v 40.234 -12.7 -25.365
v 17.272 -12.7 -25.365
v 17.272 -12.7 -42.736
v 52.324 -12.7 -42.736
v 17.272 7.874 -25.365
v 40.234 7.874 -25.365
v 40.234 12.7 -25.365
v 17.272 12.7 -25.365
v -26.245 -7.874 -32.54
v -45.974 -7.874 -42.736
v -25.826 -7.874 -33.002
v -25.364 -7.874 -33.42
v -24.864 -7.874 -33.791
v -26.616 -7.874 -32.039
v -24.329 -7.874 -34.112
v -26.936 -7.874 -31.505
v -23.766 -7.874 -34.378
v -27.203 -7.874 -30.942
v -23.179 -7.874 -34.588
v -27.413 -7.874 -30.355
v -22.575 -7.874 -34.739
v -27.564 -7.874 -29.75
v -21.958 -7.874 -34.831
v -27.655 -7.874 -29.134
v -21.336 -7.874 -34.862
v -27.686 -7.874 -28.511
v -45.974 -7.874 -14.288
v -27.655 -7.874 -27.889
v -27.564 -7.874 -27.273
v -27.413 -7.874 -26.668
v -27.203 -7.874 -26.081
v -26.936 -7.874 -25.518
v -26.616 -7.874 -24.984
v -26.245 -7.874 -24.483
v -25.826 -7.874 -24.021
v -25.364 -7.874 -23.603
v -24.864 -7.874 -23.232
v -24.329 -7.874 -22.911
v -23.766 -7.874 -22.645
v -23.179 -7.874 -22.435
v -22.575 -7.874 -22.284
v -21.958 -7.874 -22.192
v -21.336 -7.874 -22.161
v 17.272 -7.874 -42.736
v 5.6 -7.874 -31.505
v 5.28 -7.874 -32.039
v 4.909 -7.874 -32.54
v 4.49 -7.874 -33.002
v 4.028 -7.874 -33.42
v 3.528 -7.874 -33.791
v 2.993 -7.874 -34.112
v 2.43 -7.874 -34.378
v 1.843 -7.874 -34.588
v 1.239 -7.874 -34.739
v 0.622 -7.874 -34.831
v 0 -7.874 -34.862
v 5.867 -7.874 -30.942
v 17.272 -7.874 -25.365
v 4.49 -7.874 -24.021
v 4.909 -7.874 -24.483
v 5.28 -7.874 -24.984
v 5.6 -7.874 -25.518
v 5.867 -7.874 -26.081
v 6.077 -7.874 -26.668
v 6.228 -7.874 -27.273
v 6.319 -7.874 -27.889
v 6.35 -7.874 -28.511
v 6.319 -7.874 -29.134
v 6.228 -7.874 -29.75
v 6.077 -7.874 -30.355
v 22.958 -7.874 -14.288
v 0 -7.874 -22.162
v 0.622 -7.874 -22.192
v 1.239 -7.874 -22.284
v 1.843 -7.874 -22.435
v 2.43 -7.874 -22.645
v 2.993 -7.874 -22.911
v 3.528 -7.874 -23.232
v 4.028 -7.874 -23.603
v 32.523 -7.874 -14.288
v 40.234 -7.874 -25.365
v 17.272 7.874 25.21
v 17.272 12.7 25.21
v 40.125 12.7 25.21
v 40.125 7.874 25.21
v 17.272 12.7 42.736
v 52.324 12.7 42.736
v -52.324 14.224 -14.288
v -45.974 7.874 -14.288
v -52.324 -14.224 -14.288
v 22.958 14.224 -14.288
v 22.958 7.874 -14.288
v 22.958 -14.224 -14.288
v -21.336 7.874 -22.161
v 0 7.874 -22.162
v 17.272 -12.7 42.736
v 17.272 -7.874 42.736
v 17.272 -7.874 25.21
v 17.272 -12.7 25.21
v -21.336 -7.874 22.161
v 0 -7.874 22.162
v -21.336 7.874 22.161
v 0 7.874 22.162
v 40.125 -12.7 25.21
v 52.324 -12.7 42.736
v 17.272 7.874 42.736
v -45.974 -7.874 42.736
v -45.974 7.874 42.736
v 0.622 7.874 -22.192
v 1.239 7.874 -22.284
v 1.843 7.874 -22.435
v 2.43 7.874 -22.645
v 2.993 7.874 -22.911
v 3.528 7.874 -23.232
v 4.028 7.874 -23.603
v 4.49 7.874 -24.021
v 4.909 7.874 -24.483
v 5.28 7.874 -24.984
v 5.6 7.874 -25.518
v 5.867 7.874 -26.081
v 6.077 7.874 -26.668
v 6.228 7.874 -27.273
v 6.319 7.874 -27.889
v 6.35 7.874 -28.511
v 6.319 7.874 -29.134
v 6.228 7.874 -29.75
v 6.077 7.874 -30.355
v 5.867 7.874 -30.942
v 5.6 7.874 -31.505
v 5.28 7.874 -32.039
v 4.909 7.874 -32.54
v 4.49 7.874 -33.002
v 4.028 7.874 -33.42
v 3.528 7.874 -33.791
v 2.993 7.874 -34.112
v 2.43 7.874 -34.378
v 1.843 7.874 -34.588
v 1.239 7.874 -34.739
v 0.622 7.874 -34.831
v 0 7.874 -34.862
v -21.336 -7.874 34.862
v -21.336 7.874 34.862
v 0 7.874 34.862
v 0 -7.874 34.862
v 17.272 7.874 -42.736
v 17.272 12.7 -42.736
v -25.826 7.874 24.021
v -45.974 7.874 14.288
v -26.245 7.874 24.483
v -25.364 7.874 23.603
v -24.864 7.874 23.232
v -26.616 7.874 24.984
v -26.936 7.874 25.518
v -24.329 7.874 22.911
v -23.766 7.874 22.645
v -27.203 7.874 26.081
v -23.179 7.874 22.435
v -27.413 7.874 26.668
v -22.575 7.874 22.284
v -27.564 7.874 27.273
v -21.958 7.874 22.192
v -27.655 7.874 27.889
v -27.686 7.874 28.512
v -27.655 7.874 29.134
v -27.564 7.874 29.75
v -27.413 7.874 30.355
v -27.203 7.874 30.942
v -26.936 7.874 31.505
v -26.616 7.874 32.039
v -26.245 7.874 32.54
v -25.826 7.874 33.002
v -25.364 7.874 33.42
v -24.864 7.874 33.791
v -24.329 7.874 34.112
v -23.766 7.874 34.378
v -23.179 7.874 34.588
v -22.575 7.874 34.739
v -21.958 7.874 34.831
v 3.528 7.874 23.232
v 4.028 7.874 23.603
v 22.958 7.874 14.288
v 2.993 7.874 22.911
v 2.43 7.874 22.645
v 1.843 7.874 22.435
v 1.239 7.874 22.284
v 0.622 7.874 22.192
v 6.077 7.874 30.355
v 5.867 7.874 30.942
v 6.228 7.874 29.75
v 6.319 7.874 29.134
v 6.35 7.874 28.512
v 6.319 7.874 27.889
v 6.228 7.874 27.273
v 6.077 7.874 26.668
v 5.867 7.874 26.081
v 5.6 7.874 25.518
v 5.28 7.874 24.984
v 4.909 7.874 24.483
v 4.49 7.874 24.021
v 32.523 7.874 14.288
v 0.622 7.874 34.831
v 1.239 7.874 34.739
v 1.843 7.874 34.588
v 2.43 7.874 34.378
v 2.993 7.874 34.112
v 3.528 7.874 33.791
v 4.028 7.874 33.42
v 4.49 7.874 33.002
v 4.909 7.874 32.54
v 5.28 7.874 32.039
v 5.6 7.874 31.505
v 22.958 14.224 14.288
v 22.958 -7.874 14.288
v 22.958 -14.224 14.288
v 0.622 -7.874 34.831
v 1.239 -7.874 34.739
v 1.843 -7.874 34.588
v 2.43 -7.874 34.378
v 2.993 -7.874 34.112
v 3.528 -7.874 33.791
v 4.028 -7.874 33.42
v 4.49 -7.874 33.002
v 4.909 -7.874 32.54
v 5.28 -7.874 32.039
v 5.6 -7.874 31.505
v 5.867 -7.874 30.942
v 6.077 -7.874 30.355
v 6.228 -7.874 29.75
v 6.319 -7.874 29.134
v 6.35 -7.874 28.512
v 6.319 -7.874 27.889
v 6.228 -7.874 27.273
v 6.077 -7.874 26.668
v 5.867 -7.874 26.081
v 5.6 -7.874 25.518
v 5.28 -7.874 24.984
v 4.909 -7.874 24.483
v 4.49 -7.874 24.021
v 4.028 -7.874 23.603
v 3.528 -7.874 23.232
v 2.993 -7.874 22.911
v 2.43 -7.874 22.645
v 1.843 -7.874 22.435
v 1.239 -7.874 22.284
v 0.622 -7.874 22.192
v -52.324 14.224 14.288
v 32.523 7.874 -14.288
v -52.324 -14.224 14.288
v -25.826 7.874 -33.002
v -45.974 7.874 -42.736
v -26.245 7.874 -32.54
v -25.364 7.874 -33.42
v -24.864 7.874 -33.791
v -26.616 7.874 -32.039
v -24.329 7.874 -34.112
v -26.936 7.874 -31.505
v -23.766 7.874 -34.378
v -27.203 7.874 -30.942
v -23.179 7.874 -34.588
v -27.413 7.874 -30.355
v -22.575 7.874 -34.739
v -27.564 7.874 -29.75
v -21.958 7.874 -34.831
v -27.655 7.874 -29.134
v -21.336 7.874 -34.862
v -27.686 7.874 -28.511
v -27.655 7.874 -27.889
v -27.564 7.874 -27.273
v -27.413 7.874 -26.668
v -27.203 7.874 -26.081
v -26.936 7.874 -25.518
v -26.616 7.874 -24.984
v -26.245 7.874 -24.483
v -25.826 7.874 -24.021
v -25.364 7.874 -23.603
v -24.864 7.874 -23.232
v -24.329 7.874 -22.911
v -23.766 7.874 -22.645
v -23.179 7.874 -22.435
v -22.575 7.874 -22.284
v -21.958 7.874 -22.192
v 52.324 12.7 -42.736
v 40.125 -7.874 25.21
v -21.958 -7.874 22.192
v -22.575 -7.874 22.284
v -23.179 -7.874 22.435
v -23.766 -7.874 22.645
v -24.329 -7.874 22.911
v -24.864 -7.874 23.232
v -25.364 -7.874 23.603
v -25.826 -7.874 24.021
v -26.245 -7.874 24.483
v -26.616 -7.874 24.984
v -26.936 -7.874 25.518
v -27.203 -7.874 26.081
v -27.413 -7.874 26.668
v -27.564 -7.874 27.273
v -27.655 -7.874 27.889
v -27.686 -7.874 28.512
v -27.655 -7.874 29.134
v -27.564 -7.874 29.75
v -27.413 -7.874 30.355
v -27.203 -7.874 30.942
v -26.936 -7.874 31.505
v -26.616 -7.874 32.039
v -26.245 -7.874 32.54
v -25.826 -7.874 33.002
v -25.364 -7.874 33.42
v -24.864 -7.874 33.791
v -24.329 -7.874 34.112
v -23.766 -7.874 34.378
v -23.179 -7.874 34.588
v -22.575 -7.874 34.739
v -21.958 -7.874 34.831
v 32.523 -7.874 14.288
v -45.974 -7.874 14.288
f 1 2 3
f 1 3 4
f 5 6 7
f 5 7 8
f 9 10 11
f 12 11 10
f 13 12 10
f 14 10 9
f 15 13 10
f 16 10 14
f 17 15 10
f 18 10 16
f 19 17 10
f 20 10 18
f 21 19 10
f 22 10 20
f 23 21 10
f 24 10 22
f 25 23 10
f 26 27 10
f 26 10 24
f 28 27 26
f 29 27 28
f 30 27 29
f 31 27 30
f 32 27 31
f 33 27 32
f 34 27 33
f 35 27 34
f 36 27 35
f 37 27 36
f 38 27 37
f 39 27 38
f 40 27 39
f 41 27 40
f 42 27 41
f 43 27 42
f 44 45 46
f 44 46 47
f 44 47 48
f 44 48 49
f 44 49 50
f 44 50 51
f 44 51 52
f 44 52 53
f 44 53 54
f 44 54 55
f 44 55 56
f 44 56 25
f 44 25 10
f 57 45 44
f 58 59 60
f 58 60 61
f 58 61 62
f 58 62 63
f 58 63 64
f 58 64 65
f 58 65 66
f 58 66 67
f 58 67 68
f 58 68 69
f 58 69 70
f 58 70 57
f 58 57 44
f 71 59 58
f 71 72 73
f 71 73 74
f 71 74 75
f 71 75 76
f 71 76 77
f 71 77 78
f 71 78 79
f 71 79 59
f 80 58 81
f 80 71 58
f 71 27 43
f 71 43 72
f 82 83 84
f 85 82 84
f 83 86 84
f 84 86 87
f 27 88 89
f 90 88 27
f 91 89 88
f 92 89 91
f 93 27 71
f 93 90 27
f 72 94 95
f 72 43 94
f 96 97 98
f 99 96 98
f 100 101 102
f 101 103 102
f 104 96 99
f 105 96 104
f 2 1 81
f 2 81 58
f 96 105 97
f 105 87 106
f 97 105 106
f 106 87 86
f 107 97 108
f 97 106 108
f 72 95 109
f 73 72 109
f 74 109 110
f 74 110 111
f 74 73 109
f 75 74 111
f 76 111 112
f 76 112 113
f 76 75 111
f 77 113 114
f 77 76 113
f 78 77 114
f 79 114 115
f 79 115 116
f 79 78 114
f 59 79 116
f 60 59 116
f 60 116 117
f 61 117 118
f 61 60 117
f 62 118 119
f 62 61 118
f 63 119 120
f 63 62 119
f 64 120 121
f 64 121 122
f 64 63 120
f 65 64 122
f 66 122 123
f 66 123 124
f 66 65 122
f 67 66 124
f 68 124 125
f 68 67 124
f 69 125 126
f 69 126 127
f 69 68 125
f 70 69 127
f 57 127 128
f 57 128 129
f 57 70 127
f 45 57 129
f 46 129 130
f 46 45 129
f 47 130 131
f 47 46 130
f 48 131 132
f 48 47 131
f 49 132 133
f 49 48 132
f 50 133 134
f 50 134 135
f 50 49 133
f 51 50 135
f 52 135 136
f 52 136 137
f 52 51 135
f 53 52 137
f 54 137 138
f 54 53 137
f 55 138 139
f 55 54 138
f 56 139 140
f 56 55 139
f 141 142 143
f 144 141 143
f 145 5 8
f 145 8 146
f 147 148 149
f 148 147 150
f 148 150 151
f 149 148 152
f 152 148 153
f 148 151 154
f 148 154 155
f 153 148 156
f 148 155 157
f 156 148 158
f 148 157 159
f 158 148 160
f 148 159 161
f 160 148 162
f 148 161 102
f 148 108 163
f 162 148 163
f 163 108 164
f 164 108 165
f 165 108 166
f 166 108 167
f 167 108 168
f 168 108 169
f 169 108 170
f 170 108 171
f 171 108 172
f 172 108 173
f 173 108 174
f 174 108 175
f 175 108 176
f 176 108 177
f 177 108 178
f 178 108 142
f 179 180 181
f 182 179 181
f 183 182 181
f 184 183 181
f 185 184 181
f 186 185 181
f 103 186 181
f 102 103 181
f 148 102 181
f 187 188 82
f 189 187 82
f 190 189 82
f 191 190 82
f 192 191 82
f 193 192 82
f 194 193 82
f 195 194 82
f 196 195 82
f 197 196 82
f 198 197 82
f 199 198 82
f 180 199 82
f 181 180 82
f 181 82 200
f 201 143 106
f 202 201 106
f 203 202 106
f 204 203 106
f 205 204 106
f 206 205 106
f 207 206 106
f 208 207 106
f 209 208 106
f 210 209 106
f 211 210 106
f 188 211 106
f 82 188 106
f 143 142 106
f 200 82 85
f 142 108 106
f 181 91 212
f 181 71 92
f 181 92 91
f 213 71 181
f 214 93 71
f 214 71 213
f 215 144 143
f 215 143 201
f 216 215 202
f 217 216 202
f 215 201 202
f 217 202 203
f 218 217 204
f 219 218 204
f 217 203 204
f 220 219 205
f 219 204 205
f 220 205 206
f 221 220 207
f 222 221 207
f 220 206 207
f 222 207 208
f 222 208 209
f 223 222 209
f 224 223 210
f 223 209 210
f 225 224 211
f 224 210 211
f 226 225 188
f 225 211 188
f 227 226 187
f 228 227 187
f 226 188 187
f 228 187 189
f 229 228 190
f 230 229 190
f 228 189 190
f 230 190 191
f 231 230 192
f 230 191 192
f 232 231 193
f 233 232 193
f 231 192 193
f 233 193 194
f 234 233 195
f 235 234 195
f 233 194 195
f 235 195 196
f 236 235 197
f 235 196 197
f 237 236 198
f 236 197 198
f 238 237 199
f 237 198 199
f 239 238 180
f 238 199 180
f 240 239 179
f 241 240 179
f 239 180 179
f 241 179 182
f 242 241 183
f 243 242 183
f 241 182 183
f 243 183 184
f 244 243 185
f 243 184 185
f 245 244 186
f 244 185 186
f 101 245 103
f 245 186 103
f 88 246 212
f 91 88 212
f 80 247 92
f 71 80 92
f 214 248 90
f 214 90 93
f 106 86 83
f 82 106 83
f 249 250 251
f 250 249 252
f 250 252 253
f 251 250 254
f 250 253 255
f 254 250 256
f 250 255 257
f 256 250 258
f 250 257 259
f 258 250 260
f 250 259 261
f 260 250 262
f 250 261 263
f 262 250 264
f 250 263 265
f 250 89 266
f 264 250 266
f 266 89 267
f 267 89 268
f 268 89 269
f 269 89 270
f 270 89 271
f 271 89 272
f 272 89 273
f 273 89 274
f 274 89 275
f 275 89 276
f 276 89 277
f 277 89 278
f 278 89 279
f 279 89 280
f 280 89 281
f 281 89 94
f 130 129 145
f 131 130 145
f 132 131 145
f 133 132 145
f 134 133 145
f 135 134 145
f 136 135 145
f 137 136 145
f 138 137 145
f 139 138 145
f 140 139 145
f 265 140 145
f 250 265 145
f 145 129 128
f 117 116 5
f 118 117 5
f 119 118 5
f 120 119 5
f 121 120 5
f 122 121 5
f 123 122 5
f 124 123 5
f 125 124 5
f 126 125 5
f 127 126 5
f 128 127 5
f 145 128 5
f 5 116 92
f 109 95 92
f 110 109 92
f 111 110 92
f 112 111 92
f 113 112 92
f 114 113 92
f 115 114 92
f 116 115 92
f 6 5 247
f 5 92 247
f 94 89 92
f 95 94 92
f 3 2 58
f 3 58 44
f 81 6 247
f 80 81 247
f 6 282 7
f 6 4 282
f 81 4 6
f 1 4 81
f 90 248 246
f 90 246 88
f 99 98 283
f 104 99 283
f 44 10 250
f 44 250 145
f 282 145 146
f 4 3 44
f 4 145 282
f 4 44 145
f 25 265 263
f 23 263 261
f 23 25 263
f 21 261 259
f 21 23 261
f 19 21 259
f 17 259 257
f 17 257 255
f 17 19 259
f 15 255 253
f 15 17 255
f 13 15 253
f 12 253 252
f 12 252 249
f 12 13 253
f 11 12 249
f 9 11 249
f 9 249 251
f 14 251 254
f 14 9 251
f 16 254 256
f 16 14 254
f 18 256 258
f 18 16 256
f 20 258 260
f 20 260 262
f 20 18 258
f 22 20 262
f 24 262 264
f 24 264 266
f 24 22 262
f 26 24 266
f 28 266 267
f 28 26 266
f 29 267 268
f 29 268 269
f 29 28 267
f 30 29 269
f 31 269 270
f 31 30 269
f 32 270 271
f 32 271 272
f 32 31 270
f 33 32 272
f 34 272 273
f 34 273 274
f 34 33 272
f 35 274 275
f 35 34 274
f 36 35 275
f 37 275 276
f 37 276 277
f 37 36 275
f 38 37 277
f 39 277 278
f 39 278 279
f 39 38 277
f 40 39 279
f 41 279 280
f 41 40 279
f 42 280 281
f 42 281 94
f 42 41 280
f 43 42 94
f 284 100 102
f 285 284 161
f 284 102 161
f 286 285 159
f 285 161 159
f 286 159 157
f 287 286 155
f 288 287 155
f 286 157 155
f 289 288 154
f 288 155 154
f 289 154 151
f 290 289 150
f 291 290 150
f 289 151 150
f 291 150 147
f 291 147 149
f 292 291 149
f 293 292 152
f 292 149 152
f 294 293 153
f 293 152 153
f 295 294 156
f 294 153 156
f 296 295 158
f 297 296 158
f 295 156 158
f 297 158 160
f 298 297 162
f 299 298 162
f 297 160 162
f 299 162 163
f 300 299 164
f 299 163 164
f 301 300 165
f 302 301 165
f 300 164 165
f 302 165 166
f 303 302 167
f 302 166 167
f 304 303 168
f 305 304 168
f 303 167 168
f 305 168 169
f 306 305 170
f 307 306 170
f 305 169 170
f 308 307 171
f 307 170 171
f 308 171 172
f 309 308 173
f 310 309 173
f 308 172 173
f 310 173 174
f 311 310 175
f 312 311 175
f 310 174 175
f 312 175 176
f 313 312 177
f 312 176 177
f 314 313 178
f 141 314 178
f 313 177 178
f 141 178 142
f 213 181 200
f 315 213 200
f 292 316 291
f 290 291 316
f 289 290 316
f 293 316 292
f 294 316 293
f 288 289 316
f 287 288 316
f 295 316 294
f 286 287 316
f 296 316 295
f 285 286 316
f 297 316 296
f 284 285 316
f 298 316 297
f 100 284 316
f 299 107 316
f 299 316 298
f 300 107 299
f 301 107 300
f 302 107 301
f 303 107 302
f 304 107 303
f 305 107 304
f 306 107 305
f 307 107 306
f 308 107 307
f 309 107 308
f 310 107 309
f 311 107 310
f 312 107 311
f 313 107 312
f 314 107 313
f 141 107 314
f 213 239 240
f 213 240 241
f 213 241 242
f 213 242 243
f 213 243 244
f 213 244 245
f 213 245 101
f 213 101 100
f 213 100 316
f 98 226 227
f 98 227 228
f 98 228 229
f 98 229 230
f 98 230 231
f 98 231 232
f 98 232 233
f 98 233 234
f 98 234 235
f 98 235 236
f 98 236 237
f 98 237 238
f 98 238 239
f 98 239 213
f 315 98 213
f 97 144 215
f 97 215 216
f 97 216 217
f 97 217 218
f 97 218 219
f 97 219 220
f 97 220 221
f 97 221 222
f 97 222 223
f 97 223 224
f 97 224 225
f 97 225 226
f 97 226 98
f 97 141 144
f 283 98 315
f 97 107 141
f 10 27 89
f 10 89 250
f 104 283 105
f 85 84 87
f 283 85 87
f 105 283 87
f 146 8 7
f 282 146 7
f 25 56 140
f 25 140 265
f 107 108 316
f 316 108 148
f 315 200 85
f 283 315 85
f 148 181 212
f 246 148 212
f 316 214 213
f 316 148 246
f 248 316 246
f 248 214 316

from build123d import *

# Parameters (mm, degrees)
F1_DEPTH = 14.224
F2_DEPTH = 7.874
F3_DEPTH = 12.7


with BuildPart() as f1:
    # F0 (on Front) → F1 (new body, symmetric)
    with BuildSketch(Plane.XZ):
        Polygon((22.958146, 14.2875), (-45.974, 14.2875), (-52.324, 14.2875), (-52.324, -14.2875), (-45.974, -14.2875), (22.958146, -14.2875), align=None)
    extrude(amount=F1_DEPTH, both=True)

    # F0 (on Front) → F2 (join, symmetric)
    with BuildSketch(Plane.XZ):
        Polygon((17.272, 25.2095), (17.272, 42.7355), (-45.974, 42.7355), (-45.974, 14.2875), (22.958146, 14.2875), (32.52297, 14.2875), (40.125151, 25.2095), align=None)
        with BuildLine():
            Line((0, 22.1615), (-21.336, 22.1615))
            ThreePointArc((-21.336, 22.1615), (-27.686, 28.5115), (-21.336, 34.8615))
            Line((-21.336, 34.8615), (0, 34.8615))
            ThreePointArc((0, 34.8615), (6.35, 28.5115), (0, 22.1615))
        make_face(mode=Mode.SUBTRACT)
        Polygon((32.52297, -14.2875), (22.958146, -14.2875), (-45.974, -14.2875), (-45.974, -42.7355), (17.272, -42.7355), (17.272, -25.365404), (40.233667, -25.365404), align=None)
        with BuildLine():
            Line((0, -34.8615), (-21.336, -34.8615))
            ThreePointArc((-21.336, -34.8615), (-27.686, -28.5115), (-21.336, -22.1615))
            Line((-21.336, -22.1615), (0, -22.1615))
            ThreePointArc((0, -22.1615), (6.35, -28.5115), (0, -34.8615))
        make_face(mode=Mode.SUBTRACT)
    extrude(amount=F2_DEPTH, both=True)

    # F0 (on Front) → F3 (join, symmetric)
    with BuildSketch(Plane.XZ):
        Polygon((40.125151, 25.2095), (52.324, 42.7355), (17.272, 42.7355), (17.272, 25.2095), align=None)
        Polygon((52.324, -42.7355), (40.233667, -25.365404), (17.272, -25.365404), (17.272, -42.7355), align=None)
    extrude(amount=F3_DEPTH, both=True)


solid = f1.part
